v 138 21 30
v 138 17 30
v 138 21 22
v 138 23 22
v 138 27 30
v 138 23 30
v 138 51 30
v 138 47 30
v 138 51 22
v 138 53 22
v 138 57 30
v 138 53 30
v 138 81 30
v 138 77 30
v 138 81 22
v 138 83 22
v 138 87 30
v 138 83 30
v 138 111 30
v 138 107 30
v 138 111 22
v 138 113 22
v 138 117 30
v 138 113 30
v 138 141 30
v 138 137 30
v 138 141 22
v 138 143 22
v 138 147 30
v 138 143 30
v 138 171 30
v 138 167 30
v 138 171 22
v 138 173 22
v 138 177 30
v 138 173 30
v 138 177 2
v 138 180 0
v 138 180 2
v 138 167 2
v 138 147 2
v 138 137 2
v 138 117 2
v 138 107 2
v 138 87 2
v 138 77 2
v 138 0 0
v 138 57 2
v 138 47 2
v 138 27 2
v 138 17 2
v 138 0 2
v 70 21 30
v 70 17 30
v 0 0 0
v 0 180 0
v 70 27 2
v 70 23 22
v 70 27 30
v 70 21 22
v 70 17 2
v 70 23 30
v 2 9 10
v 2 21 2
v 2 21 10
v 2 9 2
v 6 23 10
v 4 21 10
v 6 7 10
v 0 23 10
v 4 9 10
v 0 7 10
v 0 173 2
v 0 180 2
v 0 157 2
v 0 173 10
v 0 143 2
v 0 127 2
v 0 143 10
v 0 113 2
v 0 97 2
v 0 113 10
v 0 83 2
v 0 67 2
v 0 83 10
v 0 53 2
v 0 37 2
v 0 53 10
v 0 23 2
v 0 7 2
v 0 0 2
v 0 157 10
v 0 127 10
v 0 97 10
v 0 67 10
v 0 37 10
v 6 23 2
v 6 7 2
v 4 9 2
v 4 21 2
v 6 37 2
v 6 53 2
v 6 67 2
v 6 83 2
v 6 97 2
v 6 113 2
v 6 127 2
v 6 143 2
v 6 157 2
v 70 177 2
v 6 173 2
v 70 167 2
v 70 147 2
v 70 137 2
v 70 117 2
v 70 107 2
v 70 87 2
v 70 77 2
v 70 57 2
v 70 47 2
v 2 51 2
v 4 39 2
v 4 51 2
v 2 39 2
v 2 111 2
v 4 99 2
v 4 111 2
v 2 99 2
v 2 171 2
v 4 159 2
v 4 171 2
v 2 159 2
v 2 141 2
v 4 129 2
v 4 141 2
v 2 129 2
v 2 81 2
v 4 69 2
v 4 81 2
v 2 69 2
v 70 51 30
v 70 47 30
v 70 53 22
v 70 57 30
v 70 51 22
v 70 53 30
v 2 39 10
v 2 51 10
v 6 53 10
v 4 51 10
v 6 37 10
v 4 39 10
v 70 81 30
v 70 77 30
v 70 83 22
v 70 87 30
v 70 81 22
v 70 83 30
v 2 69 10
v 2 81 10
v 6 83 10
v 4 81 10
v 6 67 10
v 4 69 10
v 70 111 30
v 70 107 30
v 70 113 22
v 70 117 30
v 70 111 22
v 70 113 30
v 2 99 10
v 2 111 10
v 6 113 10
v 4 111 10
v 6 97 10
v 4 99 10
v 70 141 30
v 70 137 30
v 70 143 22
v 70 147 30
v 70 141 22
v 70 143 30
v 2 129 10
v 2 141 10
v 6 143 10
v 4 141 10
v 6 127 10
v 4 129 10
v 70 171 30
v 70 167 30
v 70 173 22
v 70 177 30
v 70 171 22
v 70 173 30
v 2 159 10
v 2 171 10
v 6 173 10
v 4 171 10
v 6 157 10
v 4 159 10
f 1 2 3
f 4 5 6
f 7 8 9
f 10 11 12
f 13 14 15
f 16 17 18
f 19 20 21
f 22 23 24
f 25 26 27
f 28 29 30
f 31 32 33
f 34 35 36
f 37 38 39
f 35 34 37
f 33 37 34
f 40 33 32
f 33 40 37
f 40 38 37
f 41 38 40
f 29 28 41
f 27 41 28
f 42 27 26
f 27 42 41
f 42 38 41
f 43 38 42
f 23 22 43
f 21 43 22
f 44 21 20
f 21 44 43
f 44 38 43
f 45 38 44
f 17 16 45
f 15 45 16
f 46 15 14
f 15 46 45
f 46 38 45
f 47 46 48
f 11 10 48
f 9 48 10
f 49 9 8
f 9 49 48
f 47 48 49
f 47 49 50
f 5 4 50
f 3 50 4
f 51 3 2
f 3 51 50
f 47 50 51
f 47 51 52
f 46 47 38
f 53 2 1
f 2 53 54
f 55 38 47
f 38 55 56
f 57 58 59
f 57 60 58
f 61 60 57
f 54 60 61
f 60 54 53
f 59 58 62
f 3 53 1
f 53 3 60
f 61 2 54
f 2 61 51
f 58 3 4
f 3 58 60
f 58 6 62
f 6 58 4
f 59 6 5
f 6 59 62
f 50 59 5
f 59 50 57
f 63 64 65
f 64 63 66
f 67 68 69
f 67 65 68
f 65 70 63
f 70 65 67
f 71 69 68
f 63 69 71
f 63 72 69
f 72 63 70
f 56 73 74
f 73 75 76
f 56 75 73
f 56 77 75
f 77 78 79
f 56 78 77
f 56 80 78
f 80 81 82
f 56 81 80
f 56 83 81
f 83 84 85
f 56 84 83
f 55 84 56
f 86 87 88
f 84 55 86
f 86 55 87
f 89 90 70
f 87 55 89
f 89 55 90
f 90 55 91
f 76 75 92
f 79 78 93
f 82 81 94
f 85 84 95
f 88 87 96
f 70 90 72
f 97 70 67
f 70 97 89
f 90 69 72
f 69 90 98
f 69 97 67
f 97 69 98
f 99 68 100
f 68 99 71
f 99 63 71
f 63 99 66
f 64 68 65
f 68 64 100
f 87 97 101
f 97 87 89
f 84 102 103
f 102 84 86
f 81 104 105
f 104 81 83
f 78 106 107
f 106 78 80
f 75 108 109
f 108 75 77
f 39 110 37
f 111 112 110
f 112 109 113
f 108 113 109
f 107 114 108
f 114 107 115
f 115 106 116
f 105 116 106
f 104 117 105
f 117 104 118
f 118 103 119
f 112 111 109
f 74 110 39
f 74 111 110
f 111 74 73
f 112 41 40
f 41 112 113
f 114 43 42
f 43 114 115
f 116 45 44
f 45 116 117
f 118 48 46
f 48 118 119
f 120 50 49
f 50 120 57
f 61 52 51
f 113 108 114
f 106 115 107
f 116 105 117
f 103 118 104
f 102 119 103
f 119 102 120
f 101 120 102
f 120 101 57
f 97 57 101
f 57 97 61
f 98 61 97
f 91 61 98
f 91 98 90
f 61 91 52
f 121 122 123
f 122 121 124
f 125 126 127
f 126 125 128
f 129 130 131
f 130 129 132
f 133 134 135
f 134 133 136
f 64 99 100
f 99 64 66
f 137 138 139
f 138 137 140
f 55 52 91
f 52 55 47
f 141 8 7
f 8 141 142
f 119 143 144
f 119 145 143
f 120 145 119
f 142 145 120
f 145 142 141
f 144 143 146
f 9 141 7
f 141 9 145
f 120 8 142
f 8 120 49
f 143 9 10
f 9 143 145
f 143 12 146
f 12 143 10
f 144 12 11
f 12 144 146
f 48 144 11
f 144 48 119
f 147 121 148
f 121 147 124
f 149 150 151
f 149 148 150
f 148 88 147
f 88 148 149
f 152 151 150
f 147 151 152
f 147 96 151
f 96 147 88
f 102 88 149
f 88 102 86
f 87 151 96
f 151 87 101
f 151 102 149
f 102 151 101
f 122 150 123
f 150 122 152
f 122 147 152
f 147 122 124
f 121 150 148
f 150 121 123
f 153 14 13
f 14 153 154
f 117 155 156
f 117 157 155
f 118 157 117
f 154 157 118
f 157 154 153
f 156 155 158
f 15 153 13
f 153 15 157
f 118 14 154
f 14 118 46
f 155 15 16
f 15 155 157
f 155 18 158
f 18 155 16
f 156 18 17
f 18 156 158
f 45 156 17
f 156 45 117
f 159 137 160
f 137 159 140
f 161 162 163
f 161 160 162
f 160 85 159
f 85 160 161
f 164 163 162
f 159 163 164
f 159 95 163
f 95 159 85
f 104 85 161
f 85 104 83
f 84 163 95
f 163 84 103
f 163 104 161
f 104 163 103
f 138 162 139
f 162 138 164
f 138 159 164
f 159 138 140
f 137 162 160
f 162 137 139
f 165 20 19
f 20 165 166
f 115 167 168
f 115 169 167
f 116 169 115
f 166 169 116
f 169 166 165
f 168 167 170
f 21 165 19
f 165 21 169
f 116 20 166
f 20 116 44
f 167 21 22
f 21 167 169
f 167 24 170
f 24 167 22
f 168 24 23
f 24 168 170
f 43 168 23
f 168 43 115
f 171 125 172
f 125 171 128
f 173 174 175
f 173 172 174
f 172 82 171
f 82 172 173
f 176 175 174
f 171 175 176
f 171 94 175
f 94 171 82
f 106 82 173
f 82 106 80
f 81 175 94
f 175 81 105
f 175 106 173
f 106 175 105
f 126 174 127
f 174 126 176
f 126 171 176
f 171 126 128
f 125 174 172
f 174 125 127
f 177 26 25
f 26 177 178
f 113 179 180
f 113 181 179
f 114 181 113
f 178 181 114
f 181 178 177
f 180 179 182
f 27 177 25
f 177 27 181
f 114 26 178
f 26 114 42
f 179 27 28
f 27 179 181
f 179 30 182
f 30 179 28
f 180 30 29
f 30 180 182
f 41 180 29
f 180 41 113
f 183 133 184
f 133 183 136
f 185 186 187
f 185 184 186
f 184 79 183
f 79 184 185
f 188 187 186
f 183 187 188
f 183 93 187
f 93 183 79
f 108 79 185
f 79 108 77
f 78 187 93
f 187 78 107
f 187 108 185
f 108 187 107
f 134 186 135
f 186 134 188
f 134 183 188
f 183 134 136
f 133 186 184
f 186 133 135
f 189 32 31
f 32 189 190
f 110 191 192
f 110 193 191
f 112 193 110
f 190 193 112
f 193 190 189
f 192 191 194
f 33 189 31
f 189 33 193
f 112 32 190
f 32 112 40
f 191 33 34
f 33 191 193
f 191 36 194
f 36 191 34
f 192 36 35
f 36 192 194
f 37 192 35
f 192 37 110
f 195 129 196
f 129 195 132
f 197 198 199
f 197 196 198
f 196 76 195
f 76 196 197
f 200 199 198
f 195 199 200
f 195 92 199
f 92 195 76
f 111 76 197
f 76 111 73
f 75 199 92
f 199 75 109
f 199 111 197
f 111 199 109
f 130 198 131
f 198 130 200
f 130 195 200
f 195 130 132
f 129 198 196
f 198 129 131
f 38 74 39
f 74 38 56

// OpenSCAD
// file: ../cardshowcase.scad
module base_tarjeta(desplazamiento, posicion_tarjeta, longitud_tarjeta, altura_borde_tarjeta, altura_interior_tarjeta)
{
    color("purple") translate([ posicion_tarjeta, desplazamiento + 1, 0 ])
        cube([ longitud_tarjeta, 4, altura_borde_tarjeta + 2 ]);

    color("pink") translate([ posicion_tarjeta, desplazamiento + 5, 0 ])
        cube([ longitud_tarjeta, 2, altura_interior_tarjeta + 2 ]);

    color("purple") translate([ posicion_tarjeta, desplazamiento + 7, 0 ])
        cube([ longitud_tarjeta, 4, altura_borde_tarjeta + 2 ]);
}

module base_tarjeta_corta(desplazamiento, posicion_tarjeta, longitud_tarjeta, altura_borde_tarjeta,
                          altura_interior_tarjeta, tab_size)
{
    color("purple") translate([ posicion_tarjeta, desplazamiento + 1, 0 ])
        cube([ tab_size, 4, altura_borde_tarjeta + 2 ]);

    color("pink") translate([ posicion_tarjeta, desplazamiento + 5, 0 ])
        cube([ tab_size, 2, altura_interior_tarjeta + 2 ]);

    color("purple") translate([ posicion_tarjeta, desplazamiento + 7, 0 ])
        cube([ tab_size, 4, altura_borde_tarjeta + 2 ]);

    color("purple") translate([ longitud_tarjeta + posicion_tarjeta - tab_size, desplazamiento + 1, 0 ])
        cube([ tab_size, 4, altura_borde_tarjeta + 2 ]);

    color("pink") translate([ longitud_tarjeta + posicion_tarjeta - tab_size, desplazamiento + 5, 0 ])
        cube([ tab_size, 2, altura_interior_tarjeta + 2 ]);

    color("purple") translate([ longitud_tarjeta + posicion_tarjeta - tab_size, desplazamiento + 7, 0 ])
        cube([ tab_size, 4, altura_borde_tarjeta + 2 ]);
}

module soporte_tarjeta(tipo, size)
{
    if (tipo == "ISA8")
    {
        desplazamiento = 2;
        posicion_tarjeta = 27;
        longitud_tarjeta = 82;
        altura_borde_tarjeta = 28;
        altura_interior_tarjeta = 20;

        if (size == 0)
        {
            base_tarjeta(desplazamiento, posicion_tarjeta, longitud_tarjeta, altura_borde_tarjeta,
                         altura_interior_tarjeta);
        }
        else
        {
            base_tarjeta_corta(desplazamiento, posicion_tarjeta, longitud_tarjeta, altura_borde_tarjeta,
                               altura_interior_tarjeta, size);
        }
    }
    else if (tipo == "ISA16")
    {
        soporte_tarjeta("ISA8", size);

        desplazamiento = 2;
        posicion_tarjeta = 28 + 81 + 5;
        longitud_tarjeta = 48;
        altura_borde_tarjeta = 28;
        altura_interior_tarjeta = 20;

        if (size == 0)
        {
            base_tarjeta(desplazamiento, posicion_tarjeta, longitud_tarjeta, altura_borde_tarjeta,
                         altura_interior_tarjeta);
        }
        else
        {
            base_tarjeta_corta(desplazamiento, posicion_tarjeta, longitud_tarjeta, altura_borde_tarjeta,
                               altura_interior_tarjeta, size);
        }
    }
    else if (tipo == "VLB")
    {
        soporte_tarjeta("ISA16", size);

        desplazamiento = 2;
        posicion_tarjeta = 28 + 135 + 8;
        longitud_tarjeta = 75;
        altura_borde_tarjeta = 28;
        altura_interior_tarjeta = 20;

        if (size == 0)
        {
            base_tarjeta(desplazamiento, posicion_tarjeta, longitud_tarjeta, altura_borde_tarjeta,
                         altura_interior_tarjeta);
        }
        else
        {
            base_tarjeta_corta(desplazamiento, posicion_tarjeta, longitud_tarjeta, altura_borde_tarjeta,
                               altura_interior_tarjeta, size);
        }
    }
    else if (tipo == "PCI")
    {
        desplazamiento = 16;
        posicion_tarjeta = 43;
        longitud_tarjeta = 82;
        altura_borde_tarjeta = 28;
        altura_interior_tarjeta = 20;

        if (size == 0)
        {
            base_tarjeta(desplazamiento, posicion_tarjeta, longitud_tarjeta, altura_borde_tarjeta,
                         altura_interior_tarjeta);
        }
        else
        {
            base_tarjeta_corta(desplazamiento, posicion_tarjeta, longitud_tarjeta, altura_borde_tarjeta,
                               altura_interior_tarjeta, size);
        }
    }
    else if (tipo == "PCIe16")
    {
        desplazamiento = 16;
        posicion_tarjeta = 50;
        longitud_tarjeta = 85;
        altura_borde_tarjeta = 24;
        altura_interior_tarjeta = 16;

        if (size == 0)
        {
            base_tarjeta(desplazamiento, posicion_tarjeta, longitud_tarjeta, altura_borde_tarjeta,
                         altura_interior_tarjeta);
        }
        else
        {
            base_tarjeta_corta(desplazamiento, posicion_tarjeta, longitud_tarjeta, altura_borde_tarjeta,
                               altura_interior_tarjeta, size);
        }
    }
    else if (tipo == "PCIe8")
    {
        desplazamiento = 16;
        posicion_tarjeta = 50;
        longitud_tarjeta = 52;
        altura_borde_tarjeta = 24;
        altura_interior_tarjeta = 16;

        if (size == 0)
        {
            base_tarjeta(desplazamiento, posicion_tarjeta, longitud_tarjeta, altura_borde_tarjeta,
                         altura_interior_tarjeta);
        }
        else
        {
            base_tarjeta_corta(desplazamiento, posicion_tarjeta, longitud_tarjeta, altura_borde_tarjeta,
                               altura_interior_tarjeta, size);
        }
    }
    else if (tipo == "PCIe4")
    {
        desplazamiento = 16;
        posicion_tarjeta = 50;
        longitud_tarjeta = 35;
        altura_borde_tarjeta = 24;
        altura_interior_tarjeta = 16;

        if (size == 0)
        {
            base_tarjeta(desplazamiento, posicion_tarjeta, longitud_tarjeta, altura_borde_tarjeta,
                         altura_interior_tarjeta);
        }
        else
        {
            base_tarjeta_corta(desplazamiento, posicion_tarjeta, longitud_tarjeta, altura_borde_tarjeta,
                               altura_interior_tarjeta, size);
        }
    }
    else if (tipo == "PCIe1")
    {
        desplazamiento = 16;
        posicion_tarjeta = 50;
        longitud_tarjeta = 21;
        altura_borde_tarjeta = 24;
        altura_interior_tarjeta = 16;

        if (size == 0)
        {
            base_tarjeta(desplazamiento, posicion_tarjeta, longitud_tarjeta, altura_borde_tarjeta,
                         altura_interior_tarjeta);
        }
        else
        {
            base_tarjeta_corta(desplazamiento, posicion_tarjeta, longitud_tarjeta, altura_borde_tarjeta,
                               altura_interior_tarjeta, size);
        }
    }
    else if (tipo == "AGP")
    {
        desplazamiento = 16;
        posicion_tarjeta = 70;
        longitud_tarjeta = 68;
        altura_borde_tarjeta = 28;
        altura_interior_tarjeta = 20;

        if (size == 0)
        {
            base_tarjeta(desplazamiento, posicion_tarjeta, longitud_tarjeta, altura_borde_tarjeta,
                         altura_interior_tarjeta);
        }
        else
        {
            base_tarjeta_corta(desplazamiento, posicion_tarjeta, longitud_tarjeta, altura_borde_tarjeta,
                               altura_interior_tarjeta, size);
        }
    }
    else if (tipo == "EISA")
    {
        desplazamiento = 2;
        posicion_tarjeta = 27;
        longitud_tarjeta = 52 + 83;
        altura_borde_tarjeta = 28;
        altura_interior_tarjeta = 15;

        if (size == 0)
        {
            base_tarjeta(desplazamiento, posicion_tarjeta, longitud_tarjeta, altura_borde_tarjeta,
                         altura_interior_tarjeta);
        }
        else
        {
            base_tarjeta_corta(desplazamiento, posicion_tarjeta, longitud_tarjeta, altura_borde_tarjeta,
                               altura_interior_tarjeta, size);
        }
    }
}

module base_placa(tipo)
{
    if (tipo == "ISA8")
    {
        color("cyan") cube([ 109, 30, 2 ]);
    }
    else if (tipo == "ISA16")
    {
        color("cyan") cube([ 162, 30, 2 ]);
    }
    else if (tipo == "VLB")
    {
        color("cyan") cube([ 246, 30, 2 ]);
    }
    else if (tipo == "PCI")
    {
        color("cyan") cube([ 125, 30, 2 ]);
    }
    else if (tipo == "PCIe16")
    {
        color("cyan") cube([ 135, 30, 2 ]);
    }
    else if (tipo == "PCIe8")
    {
        color("cyan") cube([ 102, 30, 2 ]);
    }
    else if (tipo == "PCIe4")
    {
        color("cyan") cube([ 85, 30, 2 ]);
    }
    else if (tipo == "PCIe1")
    {
        color("cyan") cube([ 71, 30, 2 ]);
    }
    else if (tipo == "AGP")
    {
        color("cyan") cube([ 138, 30, 2 ]);
    }
    else if (tipo == "EISA")
    {
        color("cyan") cube([ 162, 30, 2 ]);
    }
    else if (is_num(tipo))
    {
        color("cyan") cube([ tipo, 30, 2]);
    }
}

override_base = undef;

module base(tipo)
{
    if (override_base == undef)
    {
        base_placa(tipo);
    }
    else
    {
        base_placa(override_base);
    }
}

module single_slot(tipo, position, size = 0)
{
    displacement = position * 30;

    color("red") translate([ 0, 7 + displacement, 0 ]) cube([ 2, 16, 10 ]);

    color("red") translate([ 4, 7 + displacement, 0 ]) cube([ 2, 16, 10 ]);

    color("red") translate([ 2, 7 + displacement, 0 ]) cube([ 2, 2, 10 ]);

    color("red") translate([ 2, 21 + displacement, 0 ]) cube([ 2, 2, 10 ]);

    translate([ 0, displacement, 0 ]) soporte_tarjeta(tipo, size);
    translate([ 0, displacement, 0 ]) base(tipo);
}
// main file
include <../cardshowcase.scad>

for ( i = [0 : 5] ){
    single_slot("AGP", i);
}
